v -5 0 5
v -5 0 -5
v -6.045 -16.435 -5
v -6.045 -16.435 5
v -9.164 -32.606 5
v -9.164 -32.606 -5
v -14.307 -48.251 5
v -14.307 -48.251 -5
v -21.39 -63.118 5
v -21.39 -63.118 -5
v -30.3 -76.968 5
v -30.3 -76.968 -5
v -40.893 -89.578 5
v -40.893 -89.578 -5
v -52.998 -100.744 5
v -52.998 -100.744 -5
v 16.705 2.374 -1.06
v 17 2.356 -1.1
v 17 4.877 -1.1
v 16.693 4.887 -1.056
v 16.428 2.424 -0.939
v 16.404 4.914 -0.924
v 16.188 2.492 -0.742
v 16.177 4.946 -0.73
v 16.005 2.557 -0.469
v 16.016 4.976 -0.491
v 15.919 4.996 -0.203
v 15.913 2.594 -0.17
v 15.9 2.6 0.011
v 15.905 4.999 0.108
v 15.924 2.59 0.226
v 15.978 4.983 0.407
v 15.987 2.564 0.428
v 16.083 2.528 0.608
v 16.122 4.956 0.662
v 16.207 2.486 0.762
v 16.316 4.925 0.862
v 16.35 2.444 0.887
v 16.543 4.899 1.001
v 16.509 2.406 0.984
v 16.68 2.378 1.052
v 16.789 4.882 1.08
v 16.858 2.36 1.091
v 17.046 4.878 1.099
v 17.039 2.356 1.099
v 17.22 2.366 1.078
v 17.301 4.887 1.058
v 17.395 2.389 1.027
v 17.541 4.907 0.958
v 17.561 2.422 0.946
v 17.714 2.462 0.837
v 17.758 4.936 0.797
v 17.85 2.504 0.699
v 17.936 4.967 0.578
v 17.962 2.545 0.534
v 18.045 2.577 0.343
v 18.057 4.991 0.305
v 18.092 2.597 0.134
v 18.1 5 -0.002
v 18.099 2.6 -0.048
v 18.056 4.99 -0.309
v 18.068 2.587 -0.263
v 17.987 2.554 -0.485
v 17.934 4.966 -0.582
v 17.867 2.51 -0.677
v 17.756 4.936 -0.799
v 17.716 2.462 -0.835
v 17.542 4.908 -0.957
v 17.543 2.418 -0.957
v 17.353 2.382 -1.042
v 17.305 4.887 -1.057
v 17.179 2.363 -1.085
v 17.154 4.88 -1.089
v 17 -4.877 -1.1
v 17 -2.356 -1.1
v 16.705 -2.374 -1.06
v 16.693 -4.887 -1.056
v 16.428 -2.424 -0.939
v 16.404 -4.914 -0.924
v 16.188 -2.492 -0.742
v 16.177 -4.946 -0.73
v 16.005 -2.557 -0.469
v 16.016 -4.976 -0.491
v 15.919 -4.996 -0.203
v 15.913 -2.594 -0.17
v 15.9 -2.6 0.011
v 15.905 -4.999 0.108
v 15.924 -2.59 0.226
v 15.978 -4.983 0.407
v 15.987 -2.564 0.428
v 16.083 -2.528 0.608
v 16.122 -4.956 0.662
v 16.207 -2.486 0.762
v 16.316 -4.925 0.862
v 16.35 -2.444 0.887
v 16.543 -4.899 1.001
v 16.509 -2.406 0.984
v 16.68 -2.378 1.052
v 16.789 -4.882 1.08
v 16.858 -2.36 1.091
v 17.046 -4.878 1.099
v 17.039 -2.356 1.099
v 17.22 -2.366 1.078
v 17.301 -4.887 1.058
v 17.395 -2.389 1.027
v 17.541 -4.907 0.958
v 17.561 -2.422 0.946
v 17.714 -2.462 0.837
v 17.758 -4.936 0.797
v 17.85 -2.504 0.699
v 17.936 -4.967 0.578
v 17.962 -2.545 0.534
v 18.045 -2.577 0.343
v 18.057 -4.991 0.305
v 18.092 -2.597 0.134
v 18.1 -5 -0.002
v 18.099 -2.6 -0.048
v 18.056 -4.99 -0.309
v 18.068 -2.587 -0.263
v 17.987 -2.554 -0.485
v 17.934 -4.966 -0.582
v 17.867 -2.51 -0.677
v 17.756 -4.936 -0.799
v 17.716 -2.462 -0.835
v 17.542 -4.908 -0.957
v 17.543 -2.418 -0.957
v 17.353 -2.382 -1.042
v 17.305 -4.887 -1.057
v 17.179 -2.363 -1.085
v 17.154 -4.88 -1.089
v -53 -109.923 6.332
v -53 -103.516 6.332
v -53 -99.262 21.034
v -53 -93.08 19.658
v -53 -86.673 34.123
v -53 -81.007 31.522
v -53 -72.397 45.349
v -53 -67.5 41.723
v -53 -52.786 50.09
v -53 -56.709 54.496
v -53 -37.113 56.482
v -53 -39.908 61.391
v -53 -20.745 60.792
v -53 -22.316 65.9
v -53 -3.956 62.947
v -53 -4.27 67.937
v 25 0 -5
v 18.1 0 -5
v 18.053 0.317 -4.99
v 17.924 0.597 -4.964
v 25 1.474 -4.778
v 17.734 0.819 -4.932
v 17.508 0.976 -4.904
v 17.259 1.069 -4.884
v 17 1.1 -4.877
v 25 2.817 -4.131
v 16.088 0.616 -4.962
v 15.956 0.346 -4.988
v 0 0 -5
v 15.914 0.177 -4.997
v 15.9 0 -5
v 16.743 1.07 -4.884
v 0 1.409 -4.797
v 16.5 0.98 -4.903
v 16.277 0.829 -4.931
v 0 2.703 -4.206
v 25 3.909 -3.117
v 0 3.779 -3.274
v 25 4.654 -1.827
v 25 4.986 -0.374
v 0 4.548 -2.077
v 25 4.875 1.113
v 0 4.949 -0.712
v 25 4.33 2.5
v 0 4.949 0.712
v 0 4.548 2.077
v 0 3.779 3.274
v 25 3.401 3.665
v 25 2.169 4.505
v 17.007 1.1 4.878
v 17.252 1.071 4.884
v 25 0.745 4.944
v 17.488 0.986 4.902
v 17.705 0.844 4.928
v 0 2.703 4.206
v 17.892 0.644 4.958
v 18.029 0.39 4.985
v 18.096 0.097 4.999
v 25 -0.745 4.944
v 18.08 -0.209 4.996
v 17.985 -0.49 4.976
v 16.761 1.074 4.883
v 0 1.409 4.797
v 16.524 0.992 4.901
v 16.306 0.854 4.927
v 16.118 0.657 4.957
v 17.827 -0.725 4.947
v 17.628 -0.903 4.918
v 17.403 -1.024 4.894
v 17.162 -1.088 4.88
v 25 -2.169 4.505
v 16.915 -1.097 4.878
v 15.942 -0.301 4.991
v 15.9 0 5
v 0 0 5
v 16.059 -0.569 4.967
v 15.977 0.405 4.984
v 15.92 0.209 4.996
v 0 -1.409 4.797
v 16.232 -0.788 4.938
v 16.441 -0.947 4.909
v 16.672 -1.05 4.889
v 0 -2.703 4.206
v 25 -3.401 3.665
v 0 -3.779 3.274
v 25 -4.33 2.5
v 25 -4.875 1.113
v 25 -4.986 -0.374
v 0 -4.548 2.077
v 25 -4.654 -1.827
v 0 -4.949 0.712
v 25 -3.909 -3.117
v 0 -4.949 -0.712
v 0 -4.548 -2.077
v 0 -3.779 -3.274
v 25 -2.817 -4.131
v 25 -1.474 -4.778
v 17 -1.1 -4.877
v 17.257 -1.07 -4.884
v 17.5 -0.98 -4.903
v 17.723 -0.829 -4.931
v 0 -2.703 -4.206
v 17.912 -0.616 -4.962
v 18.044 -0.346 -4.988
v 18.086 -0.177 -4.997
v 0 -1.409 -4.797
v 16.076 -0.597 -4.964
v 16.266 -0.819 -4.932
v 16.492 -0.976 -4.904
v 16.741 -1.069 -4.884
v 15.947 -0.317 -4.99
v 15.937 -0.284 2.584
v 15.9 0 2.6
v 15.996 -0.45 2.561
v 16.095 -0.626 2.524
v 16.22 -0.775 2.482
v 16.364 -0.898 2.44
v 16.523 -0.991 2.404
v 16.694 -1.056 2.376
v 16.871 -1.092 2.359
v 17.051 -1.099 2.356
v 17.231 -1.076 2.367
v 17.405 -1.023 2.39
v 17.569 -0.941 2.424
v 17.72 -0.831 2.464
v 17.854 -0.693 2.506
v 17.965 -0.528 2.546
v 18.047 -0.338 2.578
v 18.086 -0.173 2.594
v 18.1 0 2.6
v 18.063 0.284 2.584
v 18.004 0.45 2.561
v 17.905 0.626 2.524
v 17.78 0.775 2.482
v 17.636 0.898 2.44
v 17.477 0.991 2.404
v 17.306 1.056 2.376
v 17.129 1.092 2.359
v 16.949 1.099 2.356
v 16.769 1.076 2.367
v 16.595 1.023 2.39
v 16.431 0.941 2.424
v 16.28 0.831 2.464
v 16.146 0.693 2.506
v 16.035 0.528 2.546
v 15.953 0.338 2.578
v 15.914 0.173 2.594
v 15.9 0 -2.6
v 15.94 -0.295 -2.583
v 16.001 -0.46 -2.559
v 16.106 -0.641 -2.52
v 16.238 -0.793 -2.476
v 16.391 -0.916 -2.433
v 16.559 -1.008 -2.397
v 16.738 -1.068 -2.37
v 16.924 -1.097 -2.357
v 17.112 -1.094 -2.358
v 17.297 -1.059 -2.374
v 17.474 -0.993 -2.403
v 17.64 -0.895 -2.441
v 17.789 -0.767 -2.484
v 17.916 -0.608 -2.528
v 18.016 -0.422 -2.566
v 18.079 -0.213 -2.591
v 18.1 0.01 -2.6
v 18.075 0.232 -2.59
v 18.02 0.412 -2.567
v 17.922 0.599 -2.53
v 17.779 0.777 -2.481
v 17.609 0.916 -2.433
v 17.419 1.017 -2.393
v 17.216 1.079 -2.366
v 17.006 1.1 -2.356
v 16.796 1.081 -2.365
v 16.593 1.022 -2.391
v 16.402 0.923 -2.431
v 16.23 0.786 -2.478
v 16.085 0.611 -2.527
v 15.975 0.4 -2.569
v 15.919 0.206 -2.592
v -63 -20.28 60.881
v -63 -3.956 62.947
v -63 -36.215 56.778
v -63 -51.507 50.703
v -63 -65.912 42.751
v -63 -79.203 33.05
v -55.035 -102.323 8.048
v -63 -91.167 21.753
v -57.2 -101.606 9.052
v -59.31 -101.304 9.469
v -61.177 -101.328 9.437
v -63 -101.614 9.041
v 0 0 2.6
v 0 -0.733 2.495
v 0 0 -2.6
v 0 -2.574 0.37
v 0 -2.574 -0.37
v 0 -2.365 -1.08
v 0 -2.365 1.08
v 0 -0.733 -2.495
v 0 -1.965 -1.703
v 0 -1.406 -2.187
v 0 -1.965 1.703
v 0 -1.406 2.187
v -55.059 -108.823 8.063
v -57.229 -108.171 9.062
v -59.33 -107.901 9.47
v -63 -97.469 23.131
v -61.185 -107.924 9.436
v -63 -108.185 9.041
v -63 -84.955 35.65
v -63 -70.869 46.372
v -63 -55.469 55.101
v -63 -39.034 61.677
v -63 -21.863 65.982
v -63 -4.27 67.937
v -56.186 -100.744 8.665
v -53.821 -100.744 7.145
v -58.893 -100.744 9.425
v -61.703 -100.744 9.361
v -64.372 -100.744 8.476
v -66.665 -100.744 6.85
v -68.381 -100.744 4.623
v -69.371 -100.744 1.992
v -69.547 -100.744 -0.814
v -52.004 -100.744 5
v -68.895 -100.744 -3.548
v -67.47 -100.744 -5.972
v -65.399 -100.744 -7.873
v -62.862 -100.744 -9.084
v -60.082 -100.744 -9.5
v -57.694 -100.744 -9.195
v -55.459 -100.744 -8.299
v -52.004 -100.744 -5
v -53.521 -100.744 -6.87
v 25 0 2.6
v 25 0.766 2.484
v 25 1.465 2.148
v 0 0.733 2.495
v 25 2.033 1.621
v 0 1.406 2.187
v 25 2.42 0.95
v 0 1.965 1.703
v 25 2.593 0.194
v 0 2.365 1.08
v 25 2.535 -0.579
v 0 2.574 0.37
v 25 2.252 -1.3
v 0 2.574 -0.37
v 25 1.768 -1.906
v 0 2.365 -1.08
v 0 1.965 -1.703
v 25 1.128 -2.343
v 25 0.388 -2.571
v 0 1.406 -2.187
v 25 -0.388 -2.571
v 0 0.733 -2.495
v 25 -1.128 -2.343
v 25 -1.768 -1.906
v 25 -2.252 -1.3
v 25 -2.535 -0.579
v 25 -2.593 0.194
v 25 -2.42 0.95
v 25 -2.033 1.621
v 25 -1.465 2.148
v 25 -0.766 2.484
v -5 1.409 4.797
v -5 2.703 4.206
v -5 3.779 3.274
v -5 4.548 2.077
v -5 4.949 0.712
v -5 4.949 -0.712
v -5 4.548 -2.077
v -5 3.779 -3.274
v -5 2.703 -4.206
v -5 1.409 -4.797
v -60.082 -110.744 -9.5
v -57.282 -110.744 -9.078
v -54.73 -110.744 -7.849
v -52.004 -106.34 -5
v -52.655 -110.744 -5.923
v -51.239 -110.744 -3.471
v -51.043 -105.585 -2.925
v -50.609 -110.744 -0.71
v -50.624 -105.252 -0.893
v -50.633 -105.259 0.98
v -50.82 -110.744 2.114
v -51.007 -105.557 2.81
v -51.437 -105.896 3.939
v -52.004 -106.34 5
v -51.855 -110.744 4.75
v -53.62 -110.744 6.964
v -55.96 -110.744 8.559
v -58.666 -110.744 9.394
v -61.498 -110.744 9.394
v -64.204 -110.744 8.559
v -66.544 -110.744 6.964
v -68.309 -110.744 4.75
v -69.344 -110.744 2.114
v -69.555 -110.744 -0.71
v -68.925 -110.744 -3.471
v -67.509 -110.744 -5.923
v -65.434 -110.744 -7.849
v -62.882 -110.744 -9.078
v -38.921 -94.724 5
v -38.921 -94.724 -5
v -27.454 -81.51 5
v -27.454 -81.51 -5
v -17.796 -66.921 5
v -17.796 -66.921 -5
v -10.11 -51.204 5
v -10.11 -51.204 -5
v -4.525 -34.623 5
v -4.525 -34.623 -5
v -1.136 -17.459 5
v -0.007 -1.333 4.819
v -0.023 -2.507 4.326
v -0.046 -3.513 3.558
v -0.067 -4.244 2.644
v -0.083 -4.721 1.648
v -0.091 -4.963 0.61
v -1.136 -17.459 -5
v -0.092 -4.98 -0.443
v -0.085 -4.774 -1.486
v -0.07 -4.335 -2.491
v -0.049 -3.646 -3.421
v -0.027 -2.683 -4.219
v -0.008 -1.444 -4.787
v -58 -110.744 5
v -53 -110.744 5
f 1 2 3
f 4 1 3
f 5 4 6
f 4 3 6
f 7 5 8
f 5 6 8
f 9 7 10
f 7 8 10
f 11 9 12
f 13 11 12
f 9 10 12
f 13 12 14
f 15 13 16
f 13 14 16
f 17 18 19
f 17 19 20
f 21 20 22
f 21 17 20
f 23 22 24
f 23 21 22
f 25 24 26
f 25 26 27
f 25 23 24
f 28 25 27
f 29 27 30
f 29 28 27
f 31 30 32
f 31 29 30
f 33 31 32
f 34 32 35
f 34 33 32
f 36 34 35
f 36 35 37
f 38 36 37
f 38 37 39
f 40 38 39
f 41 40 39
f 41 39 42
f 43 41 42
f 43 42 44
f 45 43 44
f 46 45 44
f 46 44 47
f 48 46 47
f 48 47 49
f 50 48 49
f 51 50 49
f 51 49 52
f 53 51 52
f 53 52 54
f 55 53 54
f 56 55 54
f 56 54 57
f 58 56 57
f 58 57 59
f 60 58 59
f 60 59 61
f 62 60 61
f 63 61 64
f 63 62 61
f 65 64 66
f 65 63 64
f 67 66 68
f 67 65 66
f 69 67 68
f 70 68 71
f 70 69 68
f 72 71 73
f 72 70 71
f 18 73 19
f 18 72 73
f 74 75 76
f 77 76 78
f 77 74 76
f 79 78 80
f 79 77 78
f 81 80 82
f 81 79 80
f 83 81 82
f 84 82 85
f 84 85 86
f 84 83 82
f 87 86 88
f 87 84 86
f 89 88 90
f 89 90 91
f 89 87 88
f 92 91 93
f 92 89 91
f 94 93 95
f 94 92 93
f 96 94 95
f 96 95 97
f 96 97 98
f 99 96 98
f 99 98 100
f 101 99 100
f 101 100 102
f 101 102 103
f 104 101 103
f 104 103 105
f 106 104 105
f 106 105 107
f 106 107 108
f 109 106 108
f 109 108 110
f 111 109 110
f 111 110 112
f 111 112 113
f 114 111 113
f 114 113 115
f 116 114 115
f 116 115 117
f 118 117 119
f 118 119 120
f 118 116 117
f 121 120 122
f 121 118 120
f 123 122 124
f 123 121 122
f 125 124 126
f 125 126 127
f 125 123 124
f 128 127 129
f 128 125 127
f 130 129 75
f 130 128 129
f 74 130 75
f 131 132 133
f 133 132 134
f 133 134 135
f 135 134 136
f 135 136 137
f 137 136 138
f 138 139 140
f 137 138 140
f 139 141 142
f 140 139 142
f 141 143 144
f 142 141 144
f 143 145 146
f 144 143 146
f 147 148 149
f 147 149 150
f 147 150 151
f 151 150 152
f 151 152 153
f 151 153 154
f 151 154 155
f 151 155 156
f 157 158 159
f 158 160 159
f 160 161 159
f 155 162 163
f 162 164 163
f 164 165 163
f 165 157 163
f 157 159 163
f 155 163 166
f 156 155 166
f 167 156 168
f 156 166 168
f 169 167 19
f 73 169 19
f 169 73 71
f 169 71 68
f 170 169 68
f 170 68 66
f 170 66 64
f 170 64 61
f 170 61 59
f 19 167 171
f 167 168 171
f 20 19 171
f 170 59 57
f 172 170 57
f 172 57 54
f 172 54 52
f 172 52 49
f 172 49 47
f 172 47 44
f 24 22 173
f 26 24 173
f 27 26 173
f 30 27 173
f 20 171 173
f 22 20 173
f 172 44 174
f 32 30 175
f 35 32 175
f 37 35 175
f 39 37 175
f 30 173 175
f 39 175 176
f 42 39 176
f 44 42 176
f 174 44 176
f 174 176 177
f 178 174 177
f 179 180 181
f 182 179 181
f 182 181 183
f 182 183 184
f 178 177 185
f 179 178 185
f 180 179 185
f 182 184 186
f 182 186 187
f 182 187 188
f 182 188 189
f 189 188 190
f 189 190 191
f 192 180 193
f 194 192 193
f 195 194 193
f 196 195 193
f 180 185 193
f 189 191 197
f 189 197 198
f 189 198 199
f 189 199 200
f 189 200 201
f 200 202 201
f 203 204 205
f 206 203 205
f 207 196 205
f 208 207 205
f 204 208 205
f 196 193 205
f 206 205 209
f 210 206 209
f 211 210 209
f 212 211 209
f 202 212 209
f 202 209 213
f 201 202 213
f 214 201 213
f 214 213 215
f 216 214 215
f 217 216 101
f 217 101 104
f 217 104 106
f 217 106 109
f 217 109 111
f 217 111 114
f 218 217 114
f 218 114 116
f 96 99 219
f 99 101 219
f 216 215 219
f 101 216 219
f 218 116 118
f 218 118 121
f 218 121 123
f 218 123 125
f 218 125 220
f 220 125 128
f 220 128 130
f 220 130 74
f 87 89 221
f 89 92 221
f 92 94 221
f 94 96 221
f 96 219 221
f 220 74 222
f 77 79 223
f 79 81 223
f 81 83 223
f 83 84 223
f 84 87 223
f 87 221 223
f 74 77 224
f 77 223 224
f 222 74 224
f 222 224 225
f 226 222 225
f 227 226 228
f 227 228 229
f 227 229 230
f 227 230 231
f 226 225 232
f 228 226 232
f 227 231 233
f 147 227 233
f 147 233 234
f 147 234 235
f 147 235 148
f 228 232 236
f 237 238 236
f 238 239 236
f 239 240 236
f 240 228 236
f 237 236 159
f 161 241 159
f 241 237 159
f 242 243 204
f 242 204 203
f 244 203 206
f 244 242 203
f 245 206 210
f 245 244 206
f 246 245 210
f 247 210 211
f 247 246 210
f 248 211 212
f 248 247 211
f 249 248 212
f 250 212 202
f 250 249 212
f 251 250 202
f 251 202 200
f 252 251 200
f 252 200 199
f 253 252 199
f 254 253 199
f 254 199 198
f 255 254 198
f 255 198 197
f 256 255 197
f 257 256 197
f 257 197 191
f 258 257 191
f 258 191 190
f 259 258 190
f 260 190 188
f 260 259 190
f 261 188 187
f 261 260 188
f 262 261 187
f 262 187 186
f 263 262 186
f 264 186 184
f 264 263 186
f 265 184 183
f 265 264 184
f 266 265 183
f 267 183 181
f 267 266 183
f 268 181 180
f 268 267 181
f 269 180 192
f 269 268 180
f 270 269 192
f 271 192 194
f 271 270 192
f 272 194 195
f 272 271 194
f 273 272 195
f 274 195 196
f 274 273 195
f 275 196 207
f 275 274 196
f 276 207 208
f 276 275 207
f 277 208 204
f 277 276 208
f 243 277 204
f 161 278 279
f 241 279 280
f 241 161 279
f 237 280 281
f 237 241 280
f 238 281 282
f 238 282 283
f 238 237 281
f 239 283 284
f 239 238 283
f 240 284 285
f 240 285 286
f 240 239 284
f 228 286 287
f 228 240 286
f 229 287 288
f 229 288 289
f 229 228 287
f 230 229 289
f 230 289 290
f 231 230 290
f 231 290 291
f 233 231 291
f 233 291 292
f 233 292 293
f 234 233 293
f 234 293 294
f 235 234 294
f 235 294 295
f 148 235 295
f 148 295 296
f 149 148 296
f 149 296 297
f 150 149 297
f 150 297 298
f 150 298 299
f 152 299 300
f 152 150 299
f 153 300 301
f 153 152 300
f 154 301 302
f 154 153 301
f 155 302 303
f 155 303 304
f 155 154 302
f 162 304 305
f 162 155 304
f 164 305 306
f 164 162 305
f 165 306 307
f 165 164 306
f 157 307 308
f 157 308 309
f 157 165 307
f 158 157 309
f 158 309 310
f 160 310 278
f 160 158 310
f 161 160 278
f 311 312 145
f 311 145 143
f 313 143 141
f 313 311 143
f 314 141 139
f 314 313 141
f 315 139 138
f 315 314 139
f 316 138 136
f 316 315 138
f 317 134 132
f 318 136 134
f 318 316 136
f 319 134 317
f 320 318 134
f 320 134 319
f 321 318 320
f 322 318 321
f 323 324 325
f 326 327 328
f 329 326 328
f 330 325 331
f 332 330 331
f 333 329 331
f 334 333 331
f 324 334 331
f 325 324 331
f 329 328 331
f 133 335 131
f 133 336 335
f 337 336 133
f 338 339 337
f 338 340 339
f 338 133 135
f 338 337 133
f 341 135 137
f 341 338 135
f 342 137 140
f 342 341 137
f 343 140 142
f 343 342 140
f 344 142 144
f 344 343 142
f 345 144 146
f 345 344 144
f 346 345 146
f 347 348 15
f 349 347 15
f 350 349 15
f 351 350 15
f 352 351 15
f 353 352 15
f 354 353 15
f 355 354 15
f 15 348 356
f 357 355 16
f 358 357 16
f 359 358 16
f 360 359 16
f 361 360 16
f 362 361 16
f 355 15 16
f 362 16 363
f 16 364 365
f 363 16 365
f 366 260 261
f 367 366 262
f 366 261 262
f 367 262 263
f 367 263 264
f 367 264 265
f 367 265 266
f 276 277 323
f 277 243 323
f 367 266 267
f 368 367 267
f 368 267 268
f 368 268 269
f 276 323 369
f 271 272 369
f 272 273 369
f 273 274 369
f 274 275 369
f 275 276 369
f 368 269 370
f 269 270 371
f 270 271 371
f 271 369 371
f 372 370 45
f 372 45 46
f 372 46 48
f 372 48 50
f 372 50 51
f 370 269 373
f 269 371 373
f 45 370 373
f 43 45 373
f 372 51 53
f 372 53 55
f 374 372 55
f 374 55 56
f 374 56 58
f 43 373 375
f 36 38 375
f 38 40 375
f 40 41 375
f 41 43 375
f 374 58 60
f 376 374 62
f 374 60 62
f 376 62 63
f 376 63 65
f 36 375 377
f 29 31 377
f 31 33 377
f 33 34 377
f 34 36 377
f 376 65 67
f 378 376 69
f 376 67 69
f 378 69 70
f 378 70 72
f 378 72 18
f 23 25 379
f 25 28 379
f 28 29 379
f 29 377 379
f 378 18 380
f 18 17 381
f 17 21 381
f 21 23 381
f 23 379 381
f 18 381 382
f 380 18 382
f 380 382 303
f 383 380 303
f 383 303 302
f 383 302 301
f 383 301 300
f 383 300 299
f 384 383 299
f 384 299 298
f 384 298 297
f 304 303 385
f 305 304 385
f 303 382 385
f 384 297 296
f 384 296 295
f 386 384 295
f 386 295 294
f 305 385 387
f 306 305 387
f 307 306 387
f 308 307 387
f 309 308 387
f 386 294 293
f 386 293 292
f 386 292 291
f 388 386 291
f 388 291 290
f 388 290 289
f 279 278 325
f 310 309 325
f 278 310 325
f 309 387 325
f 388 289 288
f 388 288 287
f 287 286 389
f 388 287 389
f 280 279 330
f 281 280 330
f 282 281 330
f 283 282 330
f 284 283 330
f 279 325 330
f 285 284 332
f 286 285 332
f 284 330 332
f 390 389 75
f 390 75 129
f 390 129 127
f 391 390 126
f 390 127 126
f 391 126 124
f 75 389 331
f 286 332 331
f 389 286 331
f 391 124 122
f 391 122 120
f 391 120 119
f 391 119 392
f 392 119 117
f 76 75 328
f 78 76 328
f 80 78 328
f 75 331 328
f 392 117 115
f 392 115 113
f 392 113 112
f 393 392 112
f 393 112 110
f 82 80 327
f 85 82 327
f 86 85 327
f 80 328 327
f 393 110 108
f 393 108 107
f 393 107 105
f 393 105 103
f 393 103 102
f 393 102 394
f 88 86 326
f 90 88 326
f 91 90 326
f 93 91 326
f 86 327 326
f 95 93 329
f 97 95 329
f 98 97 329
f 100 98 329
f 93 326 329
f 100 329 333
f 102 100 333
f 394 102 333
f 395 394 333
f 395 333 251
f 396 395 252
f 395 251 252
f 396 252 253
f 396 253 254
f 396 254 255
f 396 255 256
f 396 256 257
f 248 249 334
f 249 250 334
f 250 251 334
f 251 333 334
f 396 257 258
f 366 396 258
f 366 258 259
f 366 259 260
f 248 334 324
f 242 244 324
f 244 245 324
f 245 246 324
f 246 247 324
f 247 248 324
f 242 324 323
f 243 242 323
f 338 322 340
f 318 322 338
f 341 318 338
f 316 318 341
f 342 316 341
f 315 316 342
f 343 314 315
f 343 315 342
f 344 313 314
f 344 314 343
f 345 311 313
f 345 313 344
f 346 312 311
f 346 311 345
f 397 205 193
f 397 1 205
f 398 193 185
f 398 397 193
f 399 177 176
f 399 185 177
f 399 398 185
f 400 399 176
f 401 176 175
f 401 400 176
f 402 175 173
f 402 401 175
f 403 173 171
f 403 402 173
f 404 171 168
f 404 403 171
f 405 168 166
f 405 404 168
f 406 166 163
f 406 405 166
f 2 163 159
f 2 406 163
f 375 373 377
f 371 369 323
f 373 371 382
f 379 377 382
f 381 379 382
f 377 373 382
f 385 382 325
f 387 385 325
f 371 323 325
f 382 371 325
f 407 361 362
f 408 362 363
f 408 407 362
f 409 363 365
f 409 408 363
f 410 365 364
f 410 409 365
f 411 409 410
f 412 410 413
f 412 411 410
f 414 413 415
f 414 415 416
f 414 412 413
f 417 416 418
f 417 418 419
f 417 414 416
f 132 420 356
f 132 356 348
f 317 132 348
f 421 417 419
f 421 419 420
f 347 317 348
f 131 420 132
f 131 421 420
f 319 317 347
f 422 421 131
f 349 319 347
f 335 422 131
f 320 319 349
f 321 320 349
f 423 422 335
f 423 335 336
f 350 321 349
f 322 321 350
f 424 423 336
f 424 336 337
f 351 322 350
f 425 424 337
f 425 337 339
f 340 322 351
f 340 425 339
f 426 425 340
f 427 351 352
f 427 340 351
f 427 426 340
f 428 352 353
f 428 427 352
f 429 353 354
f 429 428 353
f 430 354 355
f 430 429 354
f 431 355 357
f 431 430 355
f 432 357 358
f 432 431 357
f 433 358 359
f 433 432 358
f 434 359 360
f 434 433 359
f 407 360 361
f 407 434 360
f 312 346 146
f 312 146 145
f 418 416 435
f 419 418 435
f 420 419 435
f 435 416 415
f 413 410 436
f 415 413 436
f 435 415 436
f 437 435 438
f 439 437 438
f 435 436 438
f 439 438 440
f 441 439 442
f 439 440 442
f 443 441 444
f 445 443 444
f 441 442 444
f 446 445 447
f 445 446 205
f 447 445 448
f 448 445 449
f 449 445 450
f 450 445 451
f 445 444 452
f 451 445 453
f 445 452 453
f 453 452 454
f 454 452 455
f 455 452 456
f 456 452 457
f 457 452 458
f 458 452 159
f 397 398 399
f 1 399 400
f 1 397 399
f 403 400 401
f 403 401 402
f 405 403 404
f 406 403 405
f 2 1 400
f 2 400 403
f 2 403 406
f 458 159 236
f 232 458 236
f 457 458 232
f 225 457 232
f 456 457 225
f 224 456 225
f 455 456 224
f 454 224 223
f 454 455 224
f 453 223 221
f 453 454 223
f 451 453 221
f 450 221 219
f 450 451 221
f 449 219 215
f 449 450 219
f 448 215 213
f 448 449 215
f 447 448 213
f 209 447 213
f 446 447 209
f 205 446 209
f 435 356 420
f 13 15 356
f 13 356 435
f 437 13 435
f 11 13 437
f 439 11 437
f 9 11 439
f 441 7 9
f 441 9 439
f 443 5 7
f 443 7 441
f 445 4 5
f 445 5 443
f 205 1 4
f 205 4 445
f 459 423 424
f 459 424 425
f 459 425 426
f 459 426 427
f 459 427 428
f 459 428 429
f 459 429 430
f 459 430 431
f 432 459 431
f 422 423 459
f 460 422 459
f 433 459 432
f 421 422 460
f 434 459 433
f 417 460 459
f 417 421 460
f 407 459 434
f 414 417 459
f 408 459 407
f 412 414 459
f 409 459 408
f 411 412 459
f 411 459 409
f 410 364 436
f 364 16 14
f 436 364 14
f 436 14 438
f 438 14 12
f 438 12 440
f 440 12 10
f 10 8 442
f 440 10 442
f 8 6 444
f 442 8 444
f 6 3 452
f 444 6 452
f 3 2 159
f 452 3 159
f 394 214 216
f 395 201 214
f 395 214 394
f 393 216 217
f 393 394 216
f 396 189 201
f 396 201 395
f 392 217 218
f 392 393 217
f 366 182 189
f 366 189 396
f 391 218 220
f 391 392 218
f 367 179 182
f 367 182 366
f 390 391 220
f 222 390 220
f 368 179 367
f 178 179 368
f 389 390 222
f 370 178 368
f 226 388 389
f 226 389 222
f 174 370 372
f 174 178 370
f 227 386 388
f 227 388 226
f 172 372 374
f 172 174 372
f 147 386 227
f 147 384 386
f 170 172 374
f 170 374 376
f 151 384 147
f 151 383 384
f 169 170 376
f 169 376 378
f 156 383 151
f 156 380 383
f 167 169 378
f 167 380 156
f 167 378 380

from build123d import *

# Parameters (mm, degrees)
SKETCH1_R                = 5
BOSS_EXTRUDE1_DEPTH      = 25
SKETCH2_R                = 2.6
CUT_EXTRUDE1_DEPTH       = 25
CUT_EXTRUDE3_DEPTH       = 25
CUT_EXTRUDE3_DEPTH_BACK  = 25
SKETCH3_R                = 1.1
CUT_EXTRUDE4_DEPTH       = 25
CUT_EXTRUDE4_DEPTH_BACK  = 25
SKETCH4_R                = 1.1
BOSS_EXTRUDE2_DEPTH      = 5
BOSS_EXTRUDE2_DEPTH_BACK = 5
BOSS_EXTRUDE3_START      = 5
SKETCH6_R                = 5
BOSS_EXTRUDE3_DEPTH      = 5
BOSS_EXTRUDE4_DEPTH      = 5
BOSS_EXTRUDE4_DEPTH_BACK = 5
SKETCH8_R                = 9.5
BOSS_EXTRUDE10_DEPTH     = 10


with BuildPart() as part:
    # Sketch1 → Boss-Extrude1 (new body)
    with BuildSketch(Plane(origin=(0, 0, 0), x_dir=(0, 0, -1), z_dir=(1, 0, 0))):
        Circle(SKETCH1_R)
    extrude(amount=BOSS_EXTRUDE1_DEPTH)

    # Sketch2 → Cut-Extrude1 (cut)
    with BuildSketch(Plane.ZY):
        Circle(SKETCH2_R)
    extrude(amount=-CUT_EXTRUDE1_DEPTH, mode=Mode.SUBTRACT)

    # Sketch3 → Cut-Extrude3 (cut, two sides: drawn at the far end of the back side and taken through both)
    with BuildSketch(Plane(origin=(0, 0, 0), x_dir=(1, 0, 0), z_dir=(0, 1, 0)).offset(-CUT_EXTRUDE3_DEPTH_BACK)):
        with Locations((17, 0)):
            Circle(SKETCH3_R)
    extrude(amount=CUT_EXTRUDE3_DEPTH + CUT_EXTRUDE3_DEPTH_BACK, mode=Mode.SUBTRACT)

    # Sketch4 → Cut-Extrude4 (cut, two sides: drawn at the far end of the back side and taken through both)
    with BuildSketch(Plane.XY.offset(-CUT_EXTRUDE4_DEPTH_BACK)):
        with Locations((17, 0)):
            Circle(SKETCH4_R)
    extrude(amount=CUT_EXTRUDE4_DEPTH + CUT_EXTRUDE4_DEPTH_BACK, mode=Mode.SUBTRACT)



with BuildPart() as body_2:
    # Sketch5 → Boss-Extrude2 (new, two sides: drawn at the far end of the back side and taken through both)
    with BuildSketch(Plane.XY.offset(-BOSS_EXTRUDE2_DEPTH_BACK)):
        with BuildLine():
            Line((0, 0), (-5, 0))
            ThreePointArc((-5, 0), (-21.603552953, -63.499136863), (-67.164047662, -110.743815663))
            Line((-67.164047662, -110.743815663), (-58, -110.743815663))
            ThreePointArc((-58, -110.743815663), (-15.377599409, -62.506385089), (0, 0))
        make_face()
    extrude(amount=BOSS_EXTRUDE2_DEPTH + BOSS_EXTRUDE2_DEPTH_BACK)


with BuildPart() as part_1:
    add(part.part)

    add(body_2.part)  # Boss-Extrude3 merges body 2
    # Sketch6 → Boss-Extrude3 (add)
    with BuildSketch(Plane.ZY.offset(BOSS_EXTRUDE3_START)):
        Circle(SKETCH6_R)
    extrude(amount=-BOSS_EXTRUDE3_DEPTH)

    # Sketch7 → Boss-Extrude4 (add, two sides: drawn at the far end of the back side and taken through both)
    with BuildSketch(Plane(origin=(-58, -130.891746243, -8.226376206), x_dir=(0, 0.0627249424806172, -0.998030852023525), z_dir=(1, 0, 0)).offset(-BOSS_EXTRUDE4_DEPTH_BACK)):
        with BuildLine():
            Line((-68.071017976, 131.15), (-63.071017976, 131.15))
            ThreePointArc((-63.071017976, 131.15), (-46.774831734, 68.001453515), (-1.956245207, 20.624255297))
            Line((-1.956245207, 20.624255297), (-11.936553728, 20.93788001))
            ThreePointArc((-11.936553728, 20.93788001), (-53.801421124, 69.016374761), (-68.071017976, 131.15))
        make_face()
    extrude(amount=BOSS_EXTRUDE4_DEPTH + BOSS_EXTRUDE4_DEPTH_BACK)

    # Sketch8 → Boss-Extrude10 (add)
    with BuildSketch(Plane.XZ.offset(110.743815663)):
        with Locations((-60.082023831, 0)):
            Circle(SKETCH8_R)
    extrude(amount=-BOSS_EXTRUDE10_DEPTH)


solid = part_1.part
